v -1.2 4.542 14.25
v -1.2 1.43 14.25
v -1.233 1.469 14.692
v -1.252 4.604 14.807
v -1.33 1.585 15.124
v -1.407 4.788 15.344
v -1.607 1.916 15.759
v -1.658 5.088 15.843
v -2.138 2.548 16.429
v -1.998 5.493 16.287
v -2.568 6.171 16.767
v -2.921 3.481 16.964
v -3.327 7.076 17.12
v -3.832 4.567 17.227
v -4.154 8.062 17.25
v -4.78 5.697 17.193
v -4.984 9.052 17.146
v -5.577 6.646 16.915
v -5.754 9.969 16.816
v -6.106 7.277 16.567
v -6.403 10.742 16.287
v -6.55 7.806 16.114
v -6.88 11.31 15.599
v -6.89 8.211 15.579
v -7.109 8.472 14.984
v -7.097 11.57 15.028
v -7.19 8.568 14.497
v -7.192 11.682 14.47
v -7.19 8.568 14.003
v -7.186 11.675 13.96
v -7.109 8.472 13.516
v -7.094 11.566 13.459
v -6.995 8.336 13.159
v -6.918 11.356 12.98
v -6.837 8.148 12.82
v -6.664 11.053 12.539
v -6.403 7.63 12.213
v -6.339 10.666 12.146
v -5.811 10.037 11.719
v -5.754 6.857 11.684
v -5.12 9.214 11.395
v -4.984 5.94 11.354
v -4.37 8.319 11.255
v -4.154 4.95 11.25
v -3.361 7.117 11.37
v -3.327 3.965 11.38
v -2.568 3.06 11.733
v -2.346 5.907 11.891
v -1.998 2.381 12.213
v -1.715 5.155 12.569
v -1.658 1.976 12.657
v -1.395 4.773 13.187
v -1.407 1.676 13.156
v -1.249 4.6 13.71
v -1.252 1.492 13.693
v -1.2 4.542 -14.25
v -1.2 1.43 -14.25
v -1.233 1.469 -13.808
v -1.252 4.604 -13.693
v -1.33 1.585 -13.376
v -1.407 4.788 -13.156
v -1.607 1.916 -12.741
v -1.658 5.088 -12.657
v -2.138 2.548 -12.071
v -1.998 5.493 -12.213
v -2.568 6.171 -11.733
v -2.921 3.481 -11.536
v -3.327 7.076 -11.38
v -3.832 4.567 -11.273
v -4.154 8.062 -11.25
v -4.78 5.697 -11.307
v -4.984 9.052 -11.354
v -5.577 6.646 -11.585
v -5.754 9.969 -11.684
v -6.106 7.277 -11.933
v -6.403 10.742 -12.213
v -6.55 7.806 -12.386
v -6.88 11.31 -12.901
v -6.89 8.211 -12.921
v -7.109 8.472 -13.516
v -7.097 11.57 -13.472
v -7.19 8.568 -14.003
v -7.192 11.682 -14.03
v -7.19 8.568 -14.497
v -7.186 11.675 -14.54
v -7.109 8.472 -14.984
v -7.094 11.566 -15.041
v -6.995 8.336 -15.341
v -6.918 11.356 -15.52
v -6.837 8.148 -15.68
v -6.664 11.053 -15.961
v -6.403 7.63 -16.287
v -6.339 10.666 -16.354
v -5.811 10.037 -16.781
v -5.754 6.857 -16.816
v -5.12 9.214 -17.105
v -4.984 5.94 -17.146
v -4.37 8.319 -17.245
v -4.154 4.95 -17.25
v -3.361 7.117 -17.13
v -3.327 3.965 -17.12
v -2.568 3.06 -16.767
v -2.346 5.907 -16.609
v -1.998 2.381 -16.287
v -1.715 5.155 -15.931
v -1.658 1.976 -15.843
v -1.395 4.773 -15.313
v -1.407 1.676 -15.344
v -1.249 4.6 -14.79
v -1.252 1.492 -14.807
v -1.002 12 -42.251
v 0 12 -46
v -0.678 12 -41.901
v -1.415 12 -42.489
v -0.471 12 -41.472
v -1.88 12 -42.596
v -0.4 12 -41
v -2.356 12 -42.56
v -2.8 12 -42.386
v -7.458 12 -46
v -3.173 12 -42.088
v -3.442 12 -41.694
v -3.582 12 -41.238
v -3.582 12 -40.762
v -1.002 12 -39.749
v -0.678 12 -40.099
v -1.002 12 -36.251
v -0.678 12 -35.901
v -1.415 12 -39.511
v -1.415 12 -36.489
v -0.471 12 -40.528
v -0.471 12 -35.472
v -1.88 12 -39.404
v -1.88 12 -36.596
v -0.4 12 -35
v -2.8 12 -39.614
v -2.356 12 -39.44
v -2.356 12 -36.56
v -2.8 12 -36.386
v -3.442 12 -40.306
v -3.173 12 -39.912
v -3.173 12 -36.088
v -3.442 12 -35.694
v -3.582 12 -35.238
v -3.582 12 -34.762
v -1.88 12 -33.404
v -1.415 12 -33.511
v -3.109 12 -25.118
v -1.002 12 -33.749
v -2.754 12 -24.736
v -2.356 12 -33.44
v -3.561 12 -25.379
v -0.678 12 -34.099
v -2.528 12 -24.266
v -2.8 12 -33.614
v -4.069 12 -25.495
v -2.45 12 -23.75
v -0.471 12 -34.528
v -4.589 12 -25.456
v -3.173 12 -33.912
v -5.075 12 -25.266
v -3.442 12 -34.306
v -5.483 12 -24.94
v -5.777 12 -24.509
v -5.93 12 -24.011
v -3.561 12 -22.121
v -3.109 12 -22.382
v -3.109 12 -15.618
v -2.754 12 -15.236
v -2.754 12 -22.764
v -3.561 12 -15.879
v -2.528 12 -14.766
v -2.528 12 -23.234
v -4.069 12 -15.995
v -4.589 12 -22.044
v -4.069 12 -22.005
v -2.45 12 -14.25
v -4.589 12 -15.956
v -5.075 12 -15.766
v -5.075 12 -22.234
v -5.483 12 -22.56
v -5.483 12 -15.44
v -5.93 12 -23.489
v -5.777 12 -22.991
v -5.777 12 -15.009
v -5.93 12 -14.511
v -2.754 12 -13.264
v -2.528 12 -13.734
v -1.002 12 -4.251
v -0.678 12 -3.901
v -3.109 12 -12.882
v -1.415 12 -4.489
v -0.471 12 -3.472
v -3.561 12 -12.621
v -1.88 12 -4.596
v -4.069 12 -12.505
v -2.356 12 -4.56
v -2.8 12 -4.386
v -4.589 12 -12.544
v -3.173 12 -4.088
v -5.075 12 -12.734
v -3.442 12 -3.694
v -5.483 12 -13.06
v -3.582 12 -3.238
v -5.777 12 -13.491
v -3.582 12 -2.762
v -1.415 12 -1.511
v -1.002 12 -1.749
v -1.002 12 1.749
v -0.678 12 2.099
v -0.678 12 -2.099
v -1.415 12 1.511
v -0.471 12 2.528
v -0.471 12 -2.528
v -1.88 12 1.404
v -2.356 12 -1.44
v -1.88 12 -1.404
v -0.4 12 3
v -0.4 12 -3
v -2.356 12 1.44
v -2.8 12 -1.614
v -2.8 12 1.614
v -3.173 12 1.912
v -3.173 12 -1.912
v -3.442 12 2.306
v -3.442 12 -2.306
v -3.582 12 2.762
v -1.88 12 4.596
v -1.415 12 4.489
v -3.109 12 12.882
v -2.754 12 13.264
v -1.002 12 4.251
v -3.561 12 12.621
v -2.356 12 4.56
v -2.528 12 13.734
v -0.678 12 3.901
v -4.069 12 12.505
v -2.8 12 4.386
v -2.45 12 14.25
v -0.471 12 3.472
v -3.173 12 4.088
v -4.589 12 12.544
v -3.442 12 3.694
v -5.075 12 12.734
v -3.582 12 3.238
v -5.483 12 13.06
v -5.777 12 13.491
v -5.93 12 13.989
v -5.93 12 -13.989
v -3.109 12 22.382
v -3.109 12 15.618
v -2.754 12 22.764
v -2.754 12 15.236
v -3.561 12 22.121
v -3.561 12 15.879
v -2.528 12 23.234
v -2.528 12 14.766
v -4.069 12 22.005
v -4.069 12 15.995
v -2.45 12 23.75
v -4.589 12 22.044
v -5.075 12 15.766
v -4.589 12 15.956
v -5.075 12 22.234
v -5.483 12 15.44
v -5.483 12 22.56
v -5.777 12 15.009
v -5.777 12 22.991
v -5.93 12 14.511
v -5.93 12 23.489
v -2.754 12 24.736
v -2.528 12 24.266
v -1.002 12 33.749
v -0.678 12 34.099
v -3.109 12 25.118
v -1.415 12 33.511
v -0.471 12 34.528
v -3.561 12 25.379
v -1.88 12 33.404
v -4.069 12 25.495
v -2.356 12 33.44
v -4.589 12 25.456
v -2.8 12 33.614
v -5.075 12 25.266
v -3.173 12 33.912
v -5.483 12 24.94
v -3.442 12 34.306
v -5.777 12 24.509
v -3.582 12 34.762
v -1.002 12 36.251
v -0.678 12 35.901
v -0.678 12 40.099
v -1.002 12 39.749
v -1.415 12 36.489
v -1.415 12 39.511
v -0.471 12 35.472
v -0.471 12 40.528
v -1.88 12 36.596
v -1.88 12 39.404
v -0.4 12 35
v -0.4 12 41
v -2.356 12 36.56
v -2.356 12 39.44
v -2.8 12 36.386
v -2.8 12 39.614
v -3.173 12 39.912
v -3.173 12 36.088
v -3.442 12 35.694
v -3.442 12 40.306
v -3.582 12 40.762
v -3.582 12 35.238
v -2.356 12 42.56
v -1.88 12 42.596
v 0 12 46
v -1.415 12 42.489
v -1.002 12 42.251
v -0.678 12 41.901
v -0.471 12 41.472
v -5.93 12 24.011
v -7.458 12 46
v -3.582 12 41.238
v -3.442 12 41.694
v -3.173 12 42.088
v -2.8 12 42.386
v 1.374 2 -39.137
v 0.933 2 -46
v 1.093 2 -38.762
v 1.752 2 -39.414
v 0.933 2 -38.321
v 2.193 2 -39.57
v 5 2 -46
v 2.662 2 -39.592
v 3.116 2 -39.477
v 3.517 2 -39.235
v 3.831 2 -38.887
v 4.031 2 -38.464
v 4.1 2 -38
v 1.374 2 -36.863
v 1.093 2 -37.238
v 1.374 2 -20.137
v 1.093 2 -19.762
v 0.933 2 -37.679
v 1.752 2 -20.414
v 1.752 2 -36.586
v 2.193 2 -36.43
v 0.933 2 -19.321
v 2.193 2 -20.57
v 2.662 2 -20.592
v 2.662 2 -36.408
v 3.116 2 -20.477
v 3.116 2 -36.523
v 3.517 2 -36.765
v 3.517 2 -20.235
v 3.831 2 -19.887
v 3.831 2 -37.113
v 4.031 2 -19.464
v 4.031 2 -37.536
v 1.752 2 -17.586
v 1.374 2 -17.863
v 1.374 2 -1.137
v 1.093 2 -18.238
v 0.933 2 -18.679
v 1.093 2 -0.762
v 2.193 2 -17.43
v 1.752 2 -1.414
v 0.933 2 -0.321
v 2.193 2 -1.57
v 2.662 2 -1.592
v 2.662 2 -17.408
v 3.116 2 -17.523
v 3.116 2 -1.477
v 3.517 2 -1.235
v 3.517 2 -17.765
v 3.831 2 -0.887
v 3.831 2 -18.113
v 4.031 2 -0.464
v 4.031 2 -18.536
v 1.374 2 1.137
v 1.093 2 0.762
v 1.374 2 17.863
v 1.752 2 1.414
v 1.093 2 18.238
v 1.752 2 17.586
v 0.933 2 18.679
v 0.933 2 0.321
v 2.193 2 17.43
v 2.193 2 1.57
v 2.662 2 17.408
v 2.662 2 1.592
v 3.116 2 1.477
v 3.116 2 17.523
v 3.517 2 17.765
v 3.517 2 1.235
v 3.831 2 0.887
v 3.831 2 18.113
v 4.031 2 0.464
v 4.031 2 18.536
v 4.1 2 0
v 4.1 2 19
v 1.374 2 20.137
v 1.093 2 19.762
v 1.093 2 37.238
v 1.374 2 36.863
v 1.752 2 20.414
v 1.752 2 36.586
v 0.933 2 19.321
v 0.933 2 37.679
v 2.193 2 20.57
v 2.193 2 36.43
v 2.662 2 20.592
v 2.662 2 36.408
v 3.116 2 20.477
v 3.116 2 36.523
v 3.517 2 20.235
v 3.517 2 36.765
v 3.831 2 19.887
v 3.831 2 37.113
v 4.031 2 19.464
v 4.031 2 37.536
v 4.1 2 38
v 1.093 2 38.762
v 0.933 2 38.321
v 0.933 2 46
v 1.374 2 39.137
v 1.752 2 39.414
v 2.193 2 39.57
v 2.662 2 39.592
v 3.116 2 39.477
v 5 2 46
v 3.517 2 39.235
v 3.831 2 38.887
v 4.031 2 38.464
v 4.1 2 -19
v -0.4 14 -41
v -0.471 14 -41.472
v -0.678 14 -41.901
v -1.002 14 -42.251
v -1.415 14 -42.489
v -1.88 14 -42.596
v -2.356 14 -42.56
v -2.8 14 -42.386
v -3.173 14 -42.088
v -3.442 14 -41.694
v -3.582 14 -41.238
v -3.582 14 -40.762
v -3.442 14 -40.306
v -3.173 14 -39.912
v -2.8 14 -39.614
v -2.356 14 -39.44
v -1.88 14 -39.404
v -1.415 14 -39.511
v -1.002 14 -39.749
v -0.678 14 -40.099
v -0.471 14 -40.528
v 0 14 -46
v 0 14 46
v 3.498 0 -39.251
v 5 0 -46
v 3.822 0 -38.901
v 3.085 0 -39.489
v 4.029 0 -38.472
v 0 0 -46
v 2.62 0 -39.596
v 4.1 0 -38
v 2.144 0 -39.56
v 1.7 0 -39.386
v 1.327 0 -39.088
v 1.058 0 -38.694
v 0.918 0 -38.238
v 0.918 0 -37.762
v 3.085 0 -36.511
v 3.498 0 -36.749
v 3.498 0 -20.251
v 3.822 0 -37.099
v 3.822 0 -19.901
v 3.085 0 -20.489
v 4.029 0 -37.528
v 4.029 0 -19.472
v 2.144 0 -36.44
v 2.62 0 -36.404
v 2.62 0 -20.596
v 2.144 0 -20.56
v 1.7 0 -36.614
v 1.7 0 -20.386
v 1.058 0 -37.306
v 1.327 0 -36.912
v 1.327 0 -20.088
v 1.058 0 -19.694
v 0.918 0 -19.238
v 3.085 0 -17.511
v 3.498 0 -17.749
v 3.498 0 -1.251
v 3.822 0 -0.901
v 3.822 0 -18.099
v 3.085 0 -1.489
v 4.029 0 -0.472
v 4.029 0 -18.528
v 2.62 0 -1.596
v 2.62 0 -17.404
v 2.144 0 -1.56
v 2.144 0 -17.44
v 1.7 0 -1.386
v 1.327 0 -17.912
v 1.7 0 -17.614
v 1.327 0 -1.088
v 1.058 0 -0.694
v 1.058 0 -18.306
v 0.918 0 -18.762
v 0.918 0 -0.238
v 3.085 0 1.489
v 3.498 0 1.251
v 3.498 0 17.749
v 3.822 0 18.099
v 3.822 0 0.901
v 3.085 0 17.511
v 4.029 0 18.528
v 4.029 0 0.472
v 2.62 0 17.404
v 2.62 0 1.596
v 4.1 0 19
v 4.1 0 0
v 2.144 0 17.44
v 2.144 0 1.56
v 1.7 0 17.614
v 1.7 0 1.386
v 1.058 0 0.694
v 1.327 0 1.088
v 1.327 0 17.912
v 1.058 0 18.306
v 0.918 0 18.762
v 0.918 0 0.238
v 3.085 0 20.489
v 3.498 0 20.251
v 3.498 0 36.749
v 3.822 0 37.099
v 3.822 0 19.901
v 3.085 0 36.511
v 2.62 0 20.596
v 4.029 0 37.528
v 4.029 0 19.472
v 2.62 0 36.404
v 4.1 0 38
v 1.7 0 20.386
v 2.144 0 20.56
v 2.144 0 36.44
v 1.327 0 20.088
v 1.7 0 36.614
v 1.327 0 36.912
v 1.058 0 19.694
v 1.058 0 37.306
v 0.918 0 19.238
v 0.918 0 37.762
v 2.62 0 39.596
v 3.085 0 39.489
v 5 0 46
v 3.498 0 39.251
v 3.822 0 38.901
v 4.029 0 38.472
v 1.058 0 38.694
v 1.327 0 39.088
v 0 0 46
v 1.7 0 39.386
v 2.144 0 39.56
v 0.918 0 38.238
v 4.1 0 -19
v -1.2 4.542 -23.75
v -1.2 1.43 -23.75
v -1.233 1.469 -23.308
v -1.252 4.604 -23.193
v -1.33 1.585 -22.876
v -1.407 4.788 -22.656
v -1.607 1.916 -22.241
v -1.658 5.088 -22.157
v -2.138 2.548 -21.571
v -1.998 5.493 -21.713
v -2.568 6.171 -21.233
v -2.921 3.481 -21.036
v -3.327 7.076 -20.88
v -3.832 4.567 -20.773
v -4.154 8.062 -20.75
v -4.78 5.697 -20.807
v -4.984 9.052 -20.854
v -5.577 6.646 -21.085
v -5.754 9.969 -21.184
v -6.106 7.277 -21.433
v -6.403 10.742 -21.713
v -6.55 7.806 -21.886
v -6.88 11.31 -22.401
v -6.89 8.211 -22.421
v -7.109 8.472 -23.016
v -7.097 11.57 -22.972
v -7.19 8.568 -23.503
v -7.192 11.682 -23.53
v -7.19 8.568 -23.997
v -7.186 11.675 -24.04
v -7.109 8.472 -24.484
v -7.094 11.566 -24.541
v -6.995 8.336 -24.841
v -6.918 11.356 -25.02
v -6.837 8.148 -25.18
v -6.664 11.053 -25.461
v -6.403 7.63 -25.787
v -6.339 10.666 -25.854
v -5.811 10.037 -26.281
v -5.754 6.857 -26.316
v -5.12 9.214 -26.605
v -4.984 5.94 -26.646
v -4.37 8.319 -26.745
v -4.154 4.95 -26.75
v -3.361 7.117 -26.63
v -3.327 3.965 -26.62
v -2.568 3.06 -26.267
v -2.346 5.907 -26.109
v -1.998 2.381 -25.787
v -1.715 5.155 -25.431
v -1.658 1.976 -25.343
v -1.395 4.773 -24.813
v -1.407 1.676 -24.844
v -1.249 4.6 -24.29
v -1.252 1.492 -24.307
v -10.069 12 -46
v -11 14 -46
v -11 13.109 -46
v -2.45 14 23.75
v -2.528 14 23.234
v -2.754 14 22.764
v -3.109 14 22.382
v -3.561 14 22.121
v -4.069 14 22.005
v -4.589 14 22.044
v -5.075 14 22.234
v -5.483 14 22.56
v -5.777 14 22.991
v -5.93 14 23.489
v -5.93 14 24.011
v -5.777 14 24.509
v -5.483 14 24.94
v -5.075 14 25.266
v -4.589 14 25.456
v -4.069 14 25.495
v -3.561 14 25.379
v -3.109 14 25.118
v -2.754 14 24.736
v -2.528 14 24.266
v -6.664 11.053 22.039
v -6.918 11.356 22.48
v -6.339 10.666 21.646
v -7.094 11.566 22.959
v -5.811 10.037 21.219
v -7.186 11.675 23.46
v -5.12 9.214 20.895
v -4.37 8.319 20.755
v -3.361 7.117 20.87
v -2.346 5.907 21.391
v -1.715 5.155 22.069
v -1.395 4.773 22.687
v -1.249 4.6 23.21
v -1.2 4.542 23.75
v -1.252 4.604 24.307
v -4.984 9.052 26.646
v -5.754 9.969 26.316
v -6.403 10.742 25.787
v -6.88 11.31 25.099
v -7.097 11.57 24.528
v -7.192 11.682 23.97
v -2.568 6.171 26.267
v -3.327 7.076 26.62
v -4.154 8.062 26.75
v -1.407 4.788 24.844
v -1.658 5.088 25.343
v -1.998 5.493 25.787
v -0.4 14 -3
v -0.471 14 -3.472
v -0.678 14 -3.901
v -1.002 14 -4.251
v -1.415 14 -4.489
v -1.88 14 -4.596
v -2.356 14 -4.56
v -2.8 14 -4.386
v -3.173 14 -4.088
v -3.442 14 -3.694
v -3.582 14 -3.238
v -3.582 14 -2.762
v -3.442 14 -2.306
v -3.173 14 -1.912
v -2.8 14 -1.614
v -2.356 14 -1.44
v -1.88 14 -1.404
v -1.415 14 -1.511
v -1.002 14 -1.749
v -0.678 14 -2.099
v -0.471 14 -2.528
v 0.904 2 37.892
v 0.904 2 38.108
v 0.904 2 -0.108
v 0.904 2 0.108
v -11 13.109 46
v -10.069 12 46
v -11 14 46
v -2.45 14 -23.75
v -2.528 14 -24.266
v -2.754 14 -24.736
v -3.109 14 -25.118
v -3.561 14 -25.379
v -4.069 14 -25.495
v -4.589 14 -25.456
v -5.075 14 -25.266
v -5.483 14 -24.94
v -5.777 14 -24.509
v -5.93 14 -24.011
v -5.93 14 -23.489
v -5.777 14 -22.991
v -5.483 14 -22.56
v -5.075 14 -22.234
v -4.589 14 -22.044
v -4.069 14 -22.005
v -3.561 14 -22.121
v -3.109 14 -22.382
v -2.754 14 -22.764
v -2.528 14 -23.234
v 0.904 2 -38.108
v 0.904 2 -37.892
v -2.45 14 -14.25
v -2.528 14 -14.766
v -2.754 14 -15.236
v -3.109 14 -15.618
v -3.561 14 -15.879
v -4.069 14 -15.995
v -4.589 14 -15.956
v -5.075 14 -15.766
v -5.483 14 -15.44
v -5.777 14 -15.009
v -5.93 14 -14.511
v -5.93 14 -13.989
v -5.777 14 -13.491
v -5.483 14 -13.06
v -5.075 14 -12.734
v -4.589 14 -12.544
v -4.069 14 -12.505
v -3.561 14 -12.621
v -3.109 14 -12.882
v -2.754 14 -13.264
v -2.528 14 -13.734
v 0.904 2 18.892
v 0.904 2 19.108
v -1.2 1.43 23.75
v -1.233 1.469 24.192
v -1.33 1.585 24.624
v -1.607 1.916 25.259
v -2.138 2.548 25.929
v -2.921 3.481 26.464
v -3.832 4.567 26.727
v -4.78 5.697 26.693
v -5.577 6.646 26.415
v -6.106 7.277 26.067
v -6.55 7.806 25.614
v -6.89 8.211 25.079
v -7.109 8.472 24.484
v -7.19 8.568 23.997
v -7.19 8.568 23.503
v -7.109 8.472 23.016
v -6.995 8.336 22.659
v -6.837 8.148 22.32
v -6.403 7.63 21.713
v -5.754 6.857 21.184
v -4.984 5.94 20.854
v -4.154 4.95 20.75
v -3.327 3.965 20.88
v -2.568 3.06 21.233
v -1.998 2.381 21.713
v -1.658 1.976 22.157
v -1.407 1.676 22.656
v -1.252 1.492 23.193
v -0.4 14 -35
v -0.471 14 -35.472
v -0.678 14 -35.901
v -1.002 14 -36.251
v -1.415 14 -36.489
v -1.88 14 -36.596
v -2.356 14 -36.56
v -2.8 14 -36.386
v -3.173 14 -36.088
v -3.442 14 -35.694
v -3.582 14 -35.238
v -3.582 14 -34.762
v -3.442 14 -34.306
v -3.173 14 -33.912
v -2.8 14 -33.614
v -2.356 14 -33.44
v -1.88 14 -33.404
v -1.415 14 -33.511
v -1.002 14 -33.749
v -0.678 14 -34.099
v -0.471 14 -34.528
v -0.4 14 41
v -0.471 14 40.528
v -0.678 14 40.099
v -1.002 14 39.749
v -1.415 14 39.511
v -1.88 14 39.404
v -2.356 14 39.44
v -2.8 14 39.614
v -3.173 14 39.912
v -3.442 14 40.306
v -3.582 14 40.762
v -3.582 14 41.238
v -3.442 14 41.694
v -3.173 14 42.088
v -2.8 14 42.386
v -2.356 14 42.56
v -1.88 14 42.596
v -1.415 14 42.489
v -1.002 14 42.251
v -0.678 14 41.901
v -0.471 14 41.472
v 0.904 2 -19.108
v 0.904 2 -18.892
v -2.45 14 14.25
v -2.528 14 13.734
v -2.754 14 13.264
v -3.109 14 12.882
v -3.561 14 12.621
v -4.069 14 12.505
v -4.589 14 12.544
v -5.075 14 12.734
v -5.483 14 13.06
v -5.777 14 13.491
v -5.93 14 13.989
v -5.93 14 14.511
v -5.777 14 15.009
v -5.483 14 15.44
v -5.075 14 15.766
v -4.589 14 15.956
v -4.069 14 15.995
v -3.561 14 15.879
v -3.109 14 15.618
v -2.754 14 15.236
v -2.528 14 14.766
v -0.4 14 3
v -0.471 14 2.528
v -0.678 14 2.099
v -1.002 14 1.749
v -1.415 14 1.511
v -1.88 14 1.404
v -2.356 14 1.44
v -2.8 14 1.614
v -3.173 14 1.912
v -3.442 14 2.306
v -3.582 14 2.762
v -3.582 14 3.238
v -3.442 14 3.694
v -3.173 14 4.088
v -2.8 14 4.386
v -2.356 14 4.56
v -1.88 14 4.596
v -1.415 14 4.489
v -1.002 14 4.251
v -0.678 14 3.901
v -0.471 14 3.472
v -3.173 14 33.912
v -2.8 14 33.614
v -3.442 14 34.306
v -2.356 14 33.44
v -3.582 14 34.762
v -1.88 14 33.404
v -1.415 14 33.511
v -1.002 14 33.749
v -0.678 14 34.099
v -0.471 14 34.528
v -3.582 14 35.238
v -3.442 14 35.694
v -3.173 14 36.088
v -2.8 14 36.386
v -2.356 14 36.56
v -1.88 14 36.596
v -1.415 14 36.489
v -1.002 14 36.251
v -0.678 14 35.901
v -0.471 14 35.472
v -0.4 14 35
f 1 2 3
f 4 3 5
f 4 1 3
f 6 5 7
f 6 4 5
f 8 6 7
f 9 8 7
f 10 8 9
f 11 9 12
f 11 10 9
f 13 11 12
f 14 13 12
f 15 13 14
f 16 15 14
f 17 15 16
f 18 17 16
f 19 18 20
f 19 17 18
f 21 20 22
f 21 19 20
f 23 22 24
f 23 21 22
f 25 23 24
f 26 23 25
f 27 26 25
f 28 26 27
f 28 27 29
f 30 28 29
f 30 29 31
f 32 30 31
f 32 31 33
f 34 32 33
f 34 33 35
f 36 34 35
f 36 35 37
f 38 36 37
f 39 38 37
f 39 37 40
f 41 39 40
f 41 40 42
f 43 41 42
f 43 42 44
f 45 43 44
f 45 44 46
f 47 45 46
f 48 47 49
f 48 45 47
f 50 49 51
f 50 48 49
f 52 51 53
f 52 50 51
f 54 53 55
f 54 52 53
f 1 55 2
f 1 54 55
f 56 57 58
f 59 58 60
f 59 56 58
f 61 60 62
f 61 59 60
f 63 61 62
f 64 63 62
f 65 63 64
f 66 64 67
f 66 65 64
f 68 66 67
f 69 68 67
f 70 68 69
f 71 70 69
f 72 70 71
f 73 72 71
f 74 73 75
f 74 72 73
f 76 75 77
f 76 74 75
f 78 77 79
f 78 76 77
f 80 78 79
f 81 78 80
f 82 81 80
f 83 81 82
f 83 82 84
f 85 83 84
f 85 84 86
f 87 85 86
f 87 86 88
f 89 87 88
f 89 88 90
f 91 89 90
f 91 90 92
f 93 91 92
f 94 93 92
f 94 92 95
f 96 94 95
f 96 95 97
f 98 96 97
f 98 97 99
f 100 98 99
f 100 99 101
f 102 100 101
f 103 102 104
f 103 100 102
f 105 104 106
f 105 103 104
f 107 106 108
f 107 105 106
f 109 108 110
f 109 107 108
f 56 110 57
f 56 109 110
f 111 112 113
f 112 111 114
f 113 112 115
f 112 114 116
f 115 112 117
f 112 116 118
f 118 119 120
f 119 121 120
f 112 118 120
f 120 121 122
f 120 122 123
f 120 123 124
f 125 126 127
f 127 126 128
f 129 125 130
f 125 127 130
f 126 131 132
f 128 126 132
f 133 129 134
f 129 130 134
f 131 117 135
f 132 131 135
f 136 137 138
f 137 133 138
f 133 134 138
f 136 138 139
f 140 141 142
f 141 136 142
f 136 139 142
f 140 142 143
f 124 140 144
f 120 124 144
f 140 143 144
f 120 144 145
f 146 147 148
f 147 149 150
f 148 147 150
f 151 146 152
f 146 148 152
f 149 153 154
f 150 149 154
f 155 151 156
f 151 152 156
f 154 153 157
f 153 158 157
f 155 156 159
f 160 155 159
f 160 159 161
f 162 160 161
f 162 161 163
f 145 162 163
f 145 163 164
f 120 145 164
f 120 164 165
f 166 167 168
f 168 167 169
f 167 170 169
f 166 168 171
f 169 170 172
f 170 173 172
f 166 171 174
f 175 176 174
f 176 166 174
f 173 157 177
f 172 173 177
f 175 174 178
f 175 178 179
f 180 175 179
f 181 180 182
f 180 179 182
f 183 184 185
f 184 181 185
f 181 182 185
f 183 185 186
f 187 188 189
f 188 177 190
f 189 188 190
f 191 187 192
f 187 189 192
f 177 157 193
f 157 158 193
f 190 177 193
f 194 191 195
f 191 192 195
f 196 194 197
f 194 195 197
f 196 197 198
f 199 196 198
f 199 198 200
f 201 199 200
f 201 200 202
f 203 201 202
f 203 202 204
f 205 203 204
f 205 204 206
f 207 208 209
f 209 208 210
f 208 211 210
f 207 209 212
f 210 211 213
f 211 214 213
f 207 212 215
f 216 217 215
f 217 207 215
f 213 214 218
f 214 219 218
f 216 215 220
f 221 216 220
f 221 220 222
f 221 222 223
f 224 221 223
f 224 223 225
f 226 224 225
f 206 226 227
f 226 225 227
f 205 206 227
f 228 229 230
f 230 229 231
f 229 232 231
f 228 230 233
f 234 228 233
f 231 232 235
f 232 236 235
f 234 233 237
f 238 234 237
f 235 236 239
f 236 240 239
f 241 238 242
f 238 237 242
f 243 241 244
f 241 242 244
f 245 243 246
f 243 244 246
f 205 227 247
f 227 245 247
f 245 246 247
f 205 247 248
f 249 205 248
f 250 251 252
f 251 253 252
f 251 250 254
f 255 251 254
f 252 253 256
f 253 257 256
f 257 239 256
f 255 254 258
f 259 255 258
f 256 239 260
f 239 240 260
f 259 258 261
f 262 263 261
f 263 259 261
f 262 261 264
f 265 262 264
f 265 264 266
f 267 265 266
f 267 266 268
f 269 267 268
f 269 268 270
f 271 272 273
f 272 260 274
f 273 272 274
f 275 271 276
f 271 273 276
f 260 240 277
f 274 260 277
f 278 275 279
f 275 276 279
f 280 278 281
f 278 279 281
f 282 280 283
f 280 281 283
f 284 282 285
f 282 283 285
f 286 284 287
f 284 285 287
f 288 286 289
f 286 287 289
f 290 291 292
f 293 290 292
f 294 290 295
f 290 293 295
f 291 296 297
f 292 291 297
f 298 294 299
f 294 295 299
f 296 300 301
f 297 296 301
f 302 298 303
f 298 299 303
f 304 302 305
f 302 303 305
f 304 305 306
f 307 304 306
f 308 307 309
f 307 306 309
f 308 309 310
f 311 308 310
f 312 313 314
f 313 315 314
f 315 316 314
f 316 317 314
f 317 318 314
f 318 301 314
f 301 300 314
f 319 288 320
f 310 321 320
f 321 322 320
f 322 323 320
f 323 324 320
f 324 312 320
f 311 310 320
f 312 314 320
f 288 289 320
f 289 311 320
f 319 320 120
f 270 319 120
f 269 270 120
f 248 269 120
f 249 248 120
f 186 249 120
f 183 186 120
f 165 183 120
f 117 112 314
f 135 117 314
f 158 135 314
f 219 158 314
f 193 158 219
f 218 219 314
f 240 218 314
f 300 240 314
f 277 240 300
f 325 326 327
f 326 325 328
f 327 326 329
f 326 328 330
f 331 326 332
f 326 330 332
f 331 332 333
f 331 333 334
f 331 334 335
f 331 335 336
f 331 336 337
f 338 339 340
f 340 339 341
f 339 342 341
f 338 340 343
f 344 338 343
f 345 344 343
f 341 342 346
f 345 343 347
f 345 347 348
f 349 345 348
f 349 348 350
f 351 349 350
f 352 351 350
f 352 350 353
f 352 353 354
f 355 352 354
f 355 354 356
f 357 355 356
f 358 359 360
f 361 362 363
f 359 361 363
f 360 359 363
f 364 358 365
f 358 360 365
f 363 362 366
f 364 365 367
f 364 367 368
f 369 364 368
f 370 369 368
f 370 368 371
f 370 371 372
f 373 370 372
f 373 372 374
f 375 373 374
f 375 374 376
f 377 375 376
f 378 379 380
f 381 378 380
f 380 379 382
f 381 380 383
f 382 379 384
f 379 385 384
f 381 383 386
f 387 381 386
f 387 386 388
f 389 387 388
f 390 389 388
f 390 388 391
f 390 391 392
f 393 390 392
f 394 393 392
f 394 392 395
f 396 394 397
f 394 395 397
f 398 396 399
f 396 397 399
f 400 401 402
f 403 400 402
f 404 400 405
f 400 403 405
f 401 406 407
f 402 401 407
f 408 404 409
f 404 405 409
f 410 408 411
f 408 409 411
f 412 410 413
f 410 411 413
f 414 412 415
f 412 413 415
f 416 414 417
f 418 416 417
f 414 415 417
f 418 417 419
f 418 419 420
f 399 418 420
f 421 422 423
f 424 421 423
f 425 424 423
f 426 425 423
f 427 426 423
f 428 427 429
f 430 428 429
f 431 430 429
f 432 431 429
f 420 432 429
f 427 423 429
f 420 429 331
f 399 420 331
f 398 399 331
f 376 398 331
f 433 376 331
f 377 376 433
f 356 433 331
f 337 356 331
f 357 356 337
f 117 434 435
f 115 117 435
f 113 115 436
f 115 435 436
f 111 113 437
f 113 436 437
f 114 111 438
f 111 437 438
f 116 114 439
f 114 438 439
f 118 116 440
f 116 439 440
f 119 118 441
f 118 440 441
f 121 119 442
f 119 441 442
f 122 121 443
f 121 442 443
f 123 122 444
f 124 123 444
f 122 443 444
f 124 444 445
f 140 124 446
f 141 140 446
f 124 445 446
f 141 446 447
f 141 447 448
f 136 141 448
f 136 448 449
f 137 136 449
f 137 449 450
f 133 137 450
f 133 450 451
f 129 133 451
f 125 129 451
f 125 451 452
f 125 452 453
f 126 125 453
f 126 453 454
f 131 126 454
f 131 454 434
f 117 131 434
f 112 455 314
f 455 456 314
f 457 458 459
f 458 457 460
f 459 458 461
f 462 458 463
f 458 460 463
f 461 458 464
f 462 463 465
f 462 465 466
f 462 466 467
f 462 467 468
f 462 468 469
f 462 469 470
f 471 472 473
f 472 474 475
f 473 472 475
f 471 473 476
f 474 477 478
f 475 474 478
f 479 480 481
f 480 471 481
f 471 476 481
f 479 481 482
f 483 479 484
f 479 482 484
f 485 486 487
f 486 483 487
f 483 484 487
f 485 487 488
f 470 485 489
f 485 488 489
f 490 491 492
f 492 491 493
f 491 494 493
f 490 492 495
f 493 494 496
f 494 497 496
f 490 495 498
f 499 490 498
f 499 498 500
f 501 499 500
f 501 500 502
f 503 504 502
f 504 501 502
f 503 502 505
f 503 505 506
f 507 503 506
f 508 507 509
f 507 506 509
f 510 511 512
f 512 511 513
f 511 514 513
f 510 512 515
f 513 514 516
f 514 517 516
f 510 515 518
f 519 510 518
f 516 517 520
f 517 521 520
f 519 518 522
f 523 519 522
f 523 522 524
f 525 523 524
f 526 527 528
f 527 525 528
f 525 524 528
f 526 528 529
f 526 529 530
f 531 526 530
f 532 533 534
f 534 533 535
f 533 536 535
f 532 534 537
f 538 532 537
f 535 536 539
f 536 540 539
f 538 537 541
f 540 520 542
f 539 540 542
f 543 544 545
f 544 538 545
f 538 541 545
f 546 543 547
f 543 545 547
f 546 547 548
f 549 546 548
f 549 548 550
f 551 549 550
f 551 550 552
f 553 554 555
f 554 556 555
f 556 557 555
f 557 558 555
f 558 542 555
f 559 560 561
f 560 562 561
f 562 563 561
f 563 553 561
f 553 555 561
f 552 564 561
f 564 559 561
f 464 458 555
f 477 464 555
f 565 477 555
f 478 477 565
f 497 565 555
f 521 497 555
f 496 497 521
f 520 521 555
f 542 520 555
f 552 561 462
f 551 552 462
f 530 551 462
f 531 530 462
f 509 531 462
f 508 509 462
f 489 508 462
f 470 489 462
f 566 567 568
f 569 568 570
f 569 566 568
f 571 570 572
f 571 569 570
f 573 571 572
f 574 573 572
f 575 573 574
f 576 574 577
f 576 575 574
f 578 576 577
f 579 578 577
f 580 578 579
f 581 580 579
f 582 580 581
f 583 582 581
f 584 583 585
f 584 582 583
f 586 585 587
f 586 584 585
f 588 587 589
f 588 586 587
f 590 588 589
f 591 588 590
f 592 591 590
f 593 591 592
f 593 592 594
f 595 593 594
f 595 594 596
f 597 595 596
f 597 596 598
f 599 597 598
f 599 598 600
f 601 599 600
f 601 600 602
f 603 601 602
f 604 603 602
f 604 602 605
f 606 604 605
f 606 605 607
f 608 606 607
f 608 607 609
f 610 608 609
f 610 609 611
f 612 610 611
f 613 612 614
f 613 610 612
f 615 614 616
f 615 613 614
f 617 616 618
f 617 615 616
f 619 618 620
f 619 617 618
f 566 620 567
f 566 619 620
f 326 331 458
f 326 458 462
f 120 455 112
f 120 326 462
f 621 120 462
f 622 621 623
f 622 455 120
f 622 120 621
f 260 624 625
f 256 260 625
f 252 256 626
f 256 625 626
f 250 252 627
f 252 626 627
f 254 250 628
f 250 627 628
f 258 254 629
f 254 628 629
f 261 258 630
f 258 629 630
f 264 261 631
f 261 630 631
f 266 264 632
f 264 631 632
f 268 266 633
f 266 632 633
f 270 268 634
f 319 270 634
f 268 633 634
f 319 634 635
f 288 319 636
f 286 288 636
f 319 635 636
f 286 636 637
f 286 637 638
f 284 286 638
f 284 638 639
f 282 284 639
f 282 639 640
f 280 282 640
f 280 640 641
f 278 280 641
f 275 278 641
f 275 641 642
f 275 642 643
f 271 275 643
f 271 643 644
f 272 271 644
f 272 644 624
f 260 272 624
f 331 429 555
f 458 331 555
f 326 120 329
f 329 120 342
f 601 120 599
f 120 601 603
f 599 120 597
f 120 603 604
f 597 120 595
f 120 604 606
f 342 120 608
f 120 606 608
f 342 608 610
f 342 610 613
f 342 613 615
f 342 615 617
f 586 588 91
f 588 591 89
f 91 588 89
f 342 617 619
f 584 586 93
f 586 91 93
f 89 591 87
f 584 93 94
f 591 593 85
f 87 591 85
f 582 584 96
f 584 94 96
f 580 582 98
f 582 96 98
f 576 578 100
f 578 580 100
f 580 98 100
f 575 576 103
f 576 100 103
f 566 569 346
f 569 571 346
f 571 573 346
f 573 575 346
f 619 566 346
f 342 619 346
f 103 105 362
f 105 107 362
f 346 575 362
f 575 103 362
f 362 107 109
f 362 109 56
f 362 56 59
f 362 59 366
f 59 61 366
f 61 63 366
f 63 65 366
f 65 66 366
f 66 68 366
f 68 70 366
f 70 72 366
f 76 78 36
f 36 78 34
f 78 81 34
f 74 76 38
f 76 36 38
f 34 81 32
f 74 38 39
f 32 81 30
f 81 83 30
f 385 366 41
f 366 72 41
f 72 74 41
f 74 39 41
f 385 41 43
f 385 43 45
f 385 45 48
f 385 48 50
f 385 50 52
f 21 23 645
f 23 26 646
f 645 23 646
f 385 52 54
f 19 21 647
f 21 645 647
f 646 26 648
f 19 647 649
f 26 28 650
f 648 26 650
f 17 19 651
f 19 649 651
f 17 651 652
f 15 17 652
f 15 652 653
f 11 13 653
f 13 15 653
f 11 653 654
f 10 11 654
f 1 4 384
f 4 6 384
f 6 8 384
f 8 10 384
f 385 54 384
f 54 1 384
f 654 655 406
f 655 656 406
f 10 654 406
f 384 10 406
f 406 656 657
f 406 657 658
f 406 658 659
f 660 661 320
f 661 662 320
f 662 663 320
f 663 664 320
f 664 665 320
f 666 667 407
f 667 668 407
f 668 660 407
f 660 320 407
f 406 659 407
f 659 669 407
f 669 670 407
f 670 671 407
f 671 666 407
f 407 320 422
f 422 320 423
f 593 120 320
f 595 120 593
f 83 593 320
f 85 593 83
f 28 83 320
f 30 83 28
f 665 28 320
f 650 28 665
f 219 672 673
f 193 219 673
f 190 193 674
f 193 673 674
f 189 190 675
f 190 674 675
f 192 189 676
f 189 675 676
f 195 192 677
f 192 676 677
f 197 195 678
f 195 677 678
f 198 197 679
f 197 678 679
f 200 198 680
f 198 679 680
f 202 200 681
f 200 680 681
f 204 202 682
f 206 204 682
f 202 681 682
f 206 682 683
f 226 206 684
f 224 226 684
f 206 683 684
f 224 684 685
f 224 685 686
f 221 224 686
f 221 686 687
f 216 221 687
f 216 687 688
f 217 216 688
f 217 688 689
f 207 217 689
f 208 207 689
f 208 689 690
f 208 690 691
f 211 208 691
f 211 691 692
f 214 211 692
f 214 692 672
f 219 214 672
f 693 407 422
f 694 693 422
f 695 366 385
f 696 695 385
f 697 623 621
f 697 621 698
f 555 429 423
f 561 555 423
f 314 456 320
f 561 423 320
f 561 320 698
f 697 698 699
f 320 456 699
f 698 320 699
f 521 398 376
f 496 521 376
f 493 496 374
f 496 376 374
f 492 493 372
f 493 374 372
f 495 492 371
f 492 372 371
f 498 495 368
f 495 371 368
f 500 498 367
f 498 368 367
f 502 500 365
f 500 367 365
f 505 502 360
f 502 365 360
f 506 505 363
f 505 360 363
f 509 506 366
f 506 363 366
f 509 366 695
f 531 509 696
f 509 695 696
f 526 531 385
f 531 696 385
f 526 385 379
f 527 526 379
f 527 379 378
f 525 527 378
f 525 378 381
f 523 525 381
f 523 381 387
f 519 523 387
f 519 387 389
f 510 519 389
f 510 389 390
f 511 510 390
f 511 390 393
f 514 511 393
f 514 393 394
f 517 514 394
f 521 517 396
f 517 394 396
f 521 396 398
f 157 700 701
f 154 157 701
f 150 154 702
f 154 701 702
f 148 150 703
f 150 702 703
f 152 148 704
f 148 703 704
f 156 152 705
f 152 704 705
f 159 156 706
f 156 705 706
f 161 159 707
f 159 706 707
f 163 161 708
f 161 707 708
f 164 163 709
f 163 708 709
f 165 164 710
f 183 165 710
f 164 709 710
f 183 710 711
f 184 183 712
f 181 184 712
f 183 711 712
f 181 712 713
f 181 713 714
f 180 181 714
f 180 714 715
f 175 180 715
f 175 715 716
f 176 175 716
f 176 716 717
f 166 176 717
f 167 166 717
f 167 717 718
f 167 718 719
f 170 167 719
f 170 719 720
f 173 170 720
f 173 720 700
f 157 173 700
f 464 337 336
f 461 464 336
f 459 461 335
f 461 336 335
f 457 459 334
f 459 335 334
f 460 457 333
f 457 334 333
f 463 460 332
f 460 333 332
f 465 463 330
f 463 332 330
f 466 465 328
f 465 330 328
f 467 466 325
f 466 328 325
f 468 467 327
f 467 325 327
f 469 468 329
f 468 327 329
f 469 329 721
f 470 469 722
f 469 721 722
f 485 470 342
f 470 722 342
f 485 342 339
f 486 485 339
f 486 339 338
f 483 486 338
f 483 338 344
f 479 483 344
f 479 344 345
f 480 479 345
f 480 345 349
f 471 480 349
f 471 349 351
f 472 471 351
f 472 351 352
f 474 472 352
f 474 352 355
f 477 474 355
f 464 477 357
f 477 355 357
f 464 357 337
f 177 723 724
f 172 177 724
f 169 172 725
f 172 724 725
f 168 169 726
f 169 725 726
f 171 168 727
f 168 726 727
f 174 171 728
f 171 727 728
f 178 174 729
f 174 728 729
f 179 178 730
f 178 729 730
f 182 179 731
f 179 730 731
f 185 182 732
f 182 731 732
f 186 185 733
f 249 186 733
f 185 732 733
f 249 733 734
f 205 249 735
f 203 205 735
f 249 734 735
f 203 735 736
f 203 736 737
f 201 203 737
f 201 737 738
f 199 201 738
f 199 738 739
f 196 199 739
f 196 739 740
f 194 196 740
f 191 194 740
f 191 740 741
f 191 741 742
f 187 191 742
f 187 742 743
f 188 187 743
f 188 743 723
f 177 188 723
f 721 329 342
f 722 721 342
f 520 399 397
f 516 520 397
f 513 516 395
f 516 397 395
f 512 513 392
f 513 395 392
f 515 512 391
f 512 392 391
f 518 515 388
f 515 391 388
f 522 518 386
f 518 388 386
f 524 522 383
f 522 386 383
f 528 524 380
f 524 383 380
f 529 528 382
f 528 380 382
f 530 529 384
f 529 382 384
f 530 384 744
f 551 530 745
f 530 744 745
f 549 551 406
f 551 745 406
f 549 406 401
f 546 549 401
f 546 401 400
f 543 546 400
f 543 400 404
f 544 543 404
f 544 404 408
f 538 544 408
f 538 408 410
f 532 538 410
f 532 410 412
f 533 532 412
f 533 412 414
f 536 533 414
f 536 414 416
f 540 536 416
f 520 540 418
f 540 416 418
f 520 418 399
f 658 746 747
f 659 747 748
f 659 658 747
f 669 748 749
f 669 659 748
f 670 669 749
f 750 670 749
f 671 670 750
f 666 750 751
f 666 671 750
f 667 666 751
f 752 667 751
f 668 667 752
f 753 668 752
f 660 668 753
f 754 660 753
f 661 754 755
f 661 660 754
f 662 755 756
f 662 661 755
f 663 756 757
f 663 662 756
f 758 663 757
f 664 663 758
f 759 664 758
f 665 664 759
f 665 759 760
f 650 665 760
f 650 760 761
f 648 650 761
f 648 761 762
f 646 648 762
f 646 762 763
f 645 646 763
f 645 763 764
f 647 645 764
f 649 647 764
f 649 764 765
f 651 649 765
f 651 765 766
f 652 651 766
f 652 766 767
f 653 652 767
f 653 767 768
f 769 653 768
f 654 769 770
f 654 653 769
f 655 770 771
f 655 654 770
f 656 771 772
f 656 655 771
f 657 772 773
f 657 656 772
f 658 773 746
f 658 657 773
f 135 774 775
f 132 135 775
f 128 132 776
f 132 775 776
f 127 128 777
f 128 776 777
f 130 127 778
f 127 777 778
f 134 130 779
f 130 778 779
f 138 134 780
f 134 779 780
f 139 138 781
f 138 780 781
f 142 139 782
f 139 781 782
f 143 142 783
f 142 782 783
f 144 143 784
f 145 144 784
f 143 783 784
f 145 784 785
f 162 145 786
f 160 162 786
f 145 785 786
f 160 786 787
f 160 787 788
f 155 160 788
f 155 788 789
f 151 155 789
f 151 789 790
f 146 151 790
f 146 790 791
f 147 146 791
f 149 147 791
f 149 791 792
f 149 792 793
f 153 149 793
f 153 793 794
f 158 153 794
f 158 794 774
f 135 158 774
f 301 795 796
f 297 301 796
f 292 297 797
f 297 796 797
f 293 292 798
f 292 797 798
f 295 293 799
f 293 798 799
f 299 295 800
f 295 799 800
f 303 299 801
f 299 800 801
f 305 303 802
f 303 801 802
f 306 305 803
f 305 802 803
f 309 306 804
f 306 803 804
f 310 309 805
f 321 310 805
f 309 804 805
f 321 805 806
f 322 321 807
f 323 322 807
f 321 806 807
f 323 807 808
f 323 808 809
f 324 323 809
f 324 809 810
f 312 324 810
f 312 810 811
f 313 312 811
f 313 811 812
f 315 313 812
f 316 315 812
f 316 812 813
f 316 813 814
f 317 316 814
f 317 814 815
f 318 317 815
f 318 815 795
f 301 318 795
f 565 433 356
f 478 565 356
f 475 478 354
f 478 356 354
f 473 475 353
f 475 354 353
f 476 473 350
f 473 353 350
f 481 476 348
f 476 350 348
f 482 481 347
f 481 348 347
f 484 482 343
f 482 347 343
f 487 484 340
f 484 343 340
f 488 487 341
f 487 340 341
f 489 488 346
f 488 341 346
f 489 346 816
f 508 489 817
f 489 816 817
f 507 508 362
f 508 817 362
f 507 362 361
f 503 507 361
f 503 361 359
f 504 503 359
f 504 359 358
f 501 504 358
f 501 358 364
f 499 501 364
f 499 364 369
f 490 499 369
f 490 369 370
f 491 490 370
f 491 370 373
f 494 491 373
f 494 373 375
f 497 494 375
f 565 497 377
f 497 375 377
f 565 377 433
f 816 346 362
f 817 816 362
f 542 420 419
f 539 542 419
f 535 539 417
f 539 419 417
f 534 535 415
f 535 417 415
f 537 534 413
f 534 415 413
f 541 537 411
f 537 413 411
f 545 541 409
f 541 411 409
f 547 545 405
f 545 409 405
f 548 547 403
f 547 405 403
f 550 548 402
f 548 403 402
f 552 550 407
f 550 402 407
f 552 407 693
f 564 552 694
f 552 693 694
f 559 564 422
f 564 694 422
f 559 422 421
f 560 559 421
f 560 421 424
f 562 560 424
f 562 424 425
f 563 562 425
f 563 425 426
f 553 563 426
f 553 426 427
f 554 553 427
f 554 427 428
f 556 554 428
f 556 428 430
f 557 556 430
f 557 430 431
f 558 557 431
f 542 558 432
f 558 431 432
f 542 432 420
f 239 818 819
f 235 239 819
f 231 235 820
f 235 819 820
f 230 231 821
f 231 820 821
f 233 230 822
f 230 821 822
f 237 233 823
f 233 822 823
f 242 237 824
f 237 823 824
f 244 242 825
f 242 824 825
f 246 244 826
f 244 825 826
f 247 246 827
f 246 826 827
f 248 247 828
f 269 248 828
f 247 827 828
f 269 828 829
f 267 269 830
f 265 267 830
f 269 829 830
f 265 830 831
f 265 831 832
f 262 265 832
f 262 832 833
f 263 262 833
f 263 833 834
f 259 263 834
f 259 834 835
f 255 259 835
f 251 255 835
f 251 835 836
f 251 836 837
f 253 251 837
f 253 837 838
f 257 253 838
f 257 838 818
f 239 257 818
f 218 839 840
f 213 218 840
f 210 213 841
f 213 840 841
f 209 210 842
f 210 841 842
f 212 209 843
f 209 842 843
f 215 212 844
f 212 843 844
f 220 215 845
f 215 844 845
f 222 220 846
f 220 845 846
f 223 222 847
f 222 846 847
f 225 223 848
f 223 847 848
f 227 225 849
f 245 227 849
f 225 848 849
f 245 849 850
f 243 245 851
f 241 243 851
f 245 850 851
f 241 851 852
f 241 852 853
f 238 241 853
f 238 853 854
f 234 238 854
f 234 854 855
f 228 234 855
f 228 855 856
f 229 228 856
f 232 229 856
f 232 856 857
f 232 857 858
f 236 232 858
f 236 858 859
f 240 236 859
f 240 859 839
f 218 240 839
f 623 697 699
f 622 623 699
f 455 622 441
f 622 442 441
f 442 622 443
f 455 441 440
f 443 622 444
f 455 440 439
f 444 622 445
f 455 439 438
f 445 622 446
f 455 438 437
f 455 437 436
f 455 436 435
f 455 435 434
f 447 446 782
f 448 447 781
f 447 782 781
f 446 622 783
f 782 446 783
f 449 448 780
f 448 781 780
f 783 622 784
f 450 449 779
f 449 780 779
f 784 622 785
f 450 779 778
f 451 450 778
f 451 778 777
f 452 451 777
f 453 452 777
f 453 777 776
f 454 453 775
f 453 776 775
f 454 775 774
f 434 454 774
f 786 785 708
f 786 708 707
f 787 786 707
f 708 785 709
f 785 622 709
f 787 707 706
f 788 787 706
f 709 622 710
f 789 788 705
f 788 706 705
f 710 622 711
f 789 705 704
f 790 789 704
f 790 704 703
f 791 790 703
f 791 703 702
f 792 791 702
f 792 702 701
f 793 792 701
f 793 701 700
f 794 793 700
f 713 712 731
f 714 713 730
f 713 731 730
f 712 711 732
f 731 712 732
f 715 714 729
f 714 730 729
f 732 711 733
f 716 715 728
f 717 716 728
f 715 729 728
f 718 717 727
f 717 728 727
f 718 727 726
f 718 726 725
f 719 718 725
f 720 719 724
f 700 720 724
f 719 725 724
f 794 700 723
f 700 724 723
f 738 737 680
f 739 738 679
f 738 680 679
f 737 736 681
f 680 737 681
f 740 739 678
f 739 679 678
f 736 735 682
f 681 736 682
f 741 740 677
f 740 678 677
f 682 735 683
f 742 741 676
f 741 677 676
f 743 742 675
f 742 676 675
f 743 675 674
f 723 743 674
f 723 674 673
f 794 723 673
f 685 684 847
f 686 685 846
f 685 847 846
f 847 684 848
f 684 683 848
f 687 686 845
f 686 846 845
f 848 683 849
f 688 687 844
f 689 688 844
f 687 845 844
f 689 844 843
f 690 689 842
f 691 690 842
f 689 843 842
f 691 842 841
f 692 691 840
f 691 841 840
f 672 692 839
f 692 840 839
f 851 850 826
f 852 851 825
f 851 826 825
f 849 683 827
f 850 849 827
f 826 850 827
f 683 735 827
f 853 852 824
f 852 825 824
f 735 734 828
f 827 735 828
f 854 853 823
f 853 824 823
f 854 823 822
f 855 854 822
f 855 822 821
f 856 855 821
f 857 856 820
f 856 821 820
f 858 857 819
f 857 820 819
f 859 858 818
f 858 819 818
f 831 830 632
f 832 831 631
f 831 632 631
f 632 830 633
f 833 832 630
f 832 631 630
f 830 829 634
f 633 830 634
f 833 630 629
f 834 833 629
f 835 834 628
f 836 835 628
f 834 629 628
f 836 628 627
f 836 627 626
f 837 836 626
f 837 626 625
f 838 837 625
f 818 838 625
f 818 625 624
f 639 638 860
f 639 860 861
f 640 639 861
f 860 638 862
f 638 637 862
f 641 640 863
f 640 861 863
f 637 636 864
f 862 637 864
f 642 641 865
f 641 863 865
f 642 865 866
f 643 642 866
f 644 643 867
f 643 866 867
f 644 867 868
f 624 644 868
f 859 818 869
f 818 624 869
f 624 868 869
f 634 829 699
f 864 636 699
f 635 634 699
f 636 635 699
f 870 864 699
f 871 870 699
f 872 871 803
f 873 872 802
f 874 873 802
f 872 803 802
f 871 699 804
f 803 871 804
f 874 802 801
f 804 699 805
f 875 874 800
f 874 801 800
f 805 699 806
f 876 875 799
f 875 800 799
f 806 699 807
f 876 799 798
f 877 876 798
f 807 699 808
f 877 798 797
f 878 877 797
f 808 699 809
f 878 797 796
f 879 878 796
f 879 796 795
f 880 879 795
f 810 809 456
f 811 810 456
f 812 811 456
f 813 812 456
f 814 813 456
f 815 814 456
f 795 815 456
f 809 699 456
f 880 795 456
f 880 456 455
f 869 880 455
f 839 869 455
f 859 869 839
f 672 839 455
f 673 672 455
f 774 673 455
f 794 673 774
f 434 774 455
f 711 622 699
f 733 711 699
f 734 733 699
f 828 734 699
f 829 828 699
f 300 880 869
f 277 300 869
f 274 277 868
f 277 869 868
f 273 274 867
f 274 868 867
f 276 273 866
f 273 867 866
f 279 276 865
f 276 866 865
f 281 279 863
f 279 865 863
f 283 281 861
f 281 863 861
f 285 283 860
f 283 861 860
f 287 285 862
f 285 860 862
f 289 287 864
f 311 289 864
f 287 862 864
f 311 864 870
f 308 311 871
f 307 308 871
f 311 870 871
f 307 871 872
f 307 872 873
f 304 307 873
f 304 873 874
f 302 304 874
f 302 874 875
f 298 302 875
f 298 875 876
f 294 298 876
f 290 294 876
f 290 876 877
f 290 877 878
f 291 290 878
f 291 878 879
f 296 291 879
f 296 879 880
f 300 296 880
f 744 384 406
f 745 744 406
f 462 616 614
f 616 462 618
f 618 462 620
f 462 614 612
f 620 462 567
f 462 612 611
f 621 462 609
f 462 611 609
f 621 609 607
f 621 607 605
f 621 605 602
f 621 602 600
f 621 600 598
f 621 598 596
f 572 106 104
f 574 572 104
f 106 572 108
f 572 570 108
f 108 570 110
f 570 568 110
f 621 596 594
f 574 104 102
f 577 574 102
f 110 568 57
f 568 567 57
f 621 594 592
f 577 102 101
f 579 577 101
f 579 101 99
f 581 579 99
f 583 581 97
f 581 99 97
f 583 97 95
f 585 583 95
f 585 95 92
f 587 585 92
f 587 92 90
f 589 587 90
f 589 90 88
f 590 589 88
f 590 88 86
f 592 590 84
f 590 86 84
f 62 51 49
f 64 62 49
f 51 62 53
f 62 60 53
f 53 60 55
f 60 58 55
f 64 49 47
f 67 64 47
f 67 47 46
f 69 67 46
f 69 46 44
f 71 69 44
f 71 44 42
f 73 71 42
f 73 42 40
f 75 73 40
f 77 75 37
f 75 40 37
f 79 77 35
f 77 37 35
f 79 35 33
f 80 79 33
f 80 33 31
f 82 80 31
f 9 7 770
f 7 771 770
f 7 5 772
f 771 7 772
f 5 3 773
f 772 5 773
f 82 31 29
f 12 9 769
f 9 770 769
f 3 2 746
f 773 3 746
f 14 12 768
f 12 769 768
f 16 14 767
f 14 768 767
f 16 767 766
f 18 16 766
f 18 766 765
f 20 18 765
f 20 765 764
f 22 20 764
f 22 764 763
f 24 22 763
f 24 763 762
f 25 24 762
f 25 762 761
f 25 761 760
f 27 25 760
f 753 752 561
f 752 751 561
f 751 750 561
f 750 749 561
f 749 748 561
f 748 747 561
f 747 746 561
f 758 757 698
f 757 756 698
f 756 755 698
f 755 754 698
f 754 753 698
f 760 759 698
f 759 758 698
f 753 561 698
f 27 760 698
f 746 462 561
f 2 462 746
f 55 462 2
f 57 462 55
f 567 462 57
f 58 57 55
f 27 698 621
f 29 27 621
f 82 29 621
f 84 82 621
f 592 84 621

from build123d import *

# Parameters (mm, degrees)
EXTRUDE_1_DEPTH      = 46
EXTRUDE_1_DEPTH_BACK = 46
SKETCH_2_R           = 1.6
CUT_EXTRUDE_1_DEPTH  = 5
SKETCH_3_R           = 1.6
CUT_EXTRUDE_2_DEPTH  = 5
SKETCH_4_R           = 1.75
CUT_EXTRUDE_3_DEPTH  = 10
SKETCH_5_R           = 3
CUT_EXTRUDE_4_DEPTH  = 20
SKETCH_6_W           = 108.593038012
SKETCH_6_H           = 21.321920706
CUT_EXTRUDE_5_DEPTH  = 20


with BuildPart() as part:
    # 스케치1 → 보스-돌출1 (new, two sides: drawn at the far end of the back side and taken through both)
    with BuildSketch(Plane.XY.offset(-EXTRUDE_1_DEPTH_BACK)):
        Polygon((5, 0), (0, 0), (-10.069195574, 12), (-11, 12), (-11, 14), (0, 14), (0, 12), (-7.458380995, 12), (0.932615316, 2), (5, 2), align=None)
    extrude(amount=EXTRUDE_1_DEPTH + EXTRUDE_1_DEPTH_BACK)

    # 스케치2 → 컷-돌출1 (cut)
    with BuildSketch(Plane(origin=(0, 14, 0), x_dir=(1, 0, 0), z_dir=(0, 1, 0))):
        with Locations((-2, 41)):
            Circle(SKETCH_2_R)
        with Locations((-2, 35)):
            Circle(SKETCH_2_R)
        with Locations((-2, 3)):
            Circle(SKETCH_2_R)
        with Locations((-2, -3)):
            Circle(SKETCH_2_R)
        with Locations((-2, -35)):
            Circle(SKETCH_2_R)
        with Locations((-2, -41)):
            Circle(SKETCH_2_R)
    extrude(amount=-CUT_EXTRUDE_1_DEPTH, mode=Mode.SUBTRACT)

    # 스케치3 → 컷-돌출2 (cut)
    with BuildSketch(Plane(origin=(0, 2, 0), x_dir=(1.0, 1.17531647254689e-12, 0), z_dir=(-1.17531647254689e-12, 1.0, 0))):
        with Locations((2.5, 38)):
            Circle(SKETCH_3_R)
        with Locations((2.5, 19)):
            Circle(SKETCH_3_R)
        with Locations((2.5, 0)):
            Circle(SKETCH_3_R)
        with Locations((2.5, -19)):
            Circle(SKETCH_3_R)
        with Locations((2.5, -38)):
            Circle(SKETCH_3_R)
    extrude(amount=-CUT_EXTRUDE_2_DEPTH, mode=Mode.SUBTRACT)

    # 스케치4 → 컷-돌출3 (cut)
    with BuildSketch(Plane(origin=(0, 14, 0), x_dir=(1, 0, 0), z_dir=(0, 1, 0))):
        with Locations((-4.2, 23.75)):
            Circle(SKETCH_4_R)
        with Locations((-4.2, 14.25)):
            Circle(SKETCH_4_R)
        with Locations((-4.2, -14.25)):
            Circle(SKETCH_4_R)
        with Locations((-4.2, -23.75)):
            Circle(SKETCH_4_R)
    extrude(amount=-CUT_EXTRUDE_3_DEPTH, mode=Mode.SUBTRACT)

    # 스케치5 → 컷-돌출4 (cut)
    with BuildSketch(Plane.XZ.offset(-12)):
        with Locations((-4.2, 23.75)):
            Circle(SKETCH_5_R)
        with Locations((-4.2, 14.25)):
            Circle(SKETCH_5_R)
        with Locations((-4.2, -14.25)):
            Circle(SKETCH_5_R)
        with Locations((-4.2, -23.75)):
            Circle(SKETCH_5_R)
    extrude(amount=CUT_EXTRUDE_4_DEPTH, mode=Mode.SUBTRACT)

    # 스케치6 → 컷-돌출5 (cut)
    with BuildSketch(Plane(origin=(0, 0, 0), x_dir=(0, 0, 1), z_dir=(-0.766044443118979, -0.6427876096865381, 0))):
        with Locations((-2.330535519, 21.720159804)):
            Rectangle(SKETCH_6_W, SKETCH_6_H)
    extrude(amount=CUT_EXTRUDE_5_DEPTH, mode=Mode.SUBTRACT)


solid = part.part
